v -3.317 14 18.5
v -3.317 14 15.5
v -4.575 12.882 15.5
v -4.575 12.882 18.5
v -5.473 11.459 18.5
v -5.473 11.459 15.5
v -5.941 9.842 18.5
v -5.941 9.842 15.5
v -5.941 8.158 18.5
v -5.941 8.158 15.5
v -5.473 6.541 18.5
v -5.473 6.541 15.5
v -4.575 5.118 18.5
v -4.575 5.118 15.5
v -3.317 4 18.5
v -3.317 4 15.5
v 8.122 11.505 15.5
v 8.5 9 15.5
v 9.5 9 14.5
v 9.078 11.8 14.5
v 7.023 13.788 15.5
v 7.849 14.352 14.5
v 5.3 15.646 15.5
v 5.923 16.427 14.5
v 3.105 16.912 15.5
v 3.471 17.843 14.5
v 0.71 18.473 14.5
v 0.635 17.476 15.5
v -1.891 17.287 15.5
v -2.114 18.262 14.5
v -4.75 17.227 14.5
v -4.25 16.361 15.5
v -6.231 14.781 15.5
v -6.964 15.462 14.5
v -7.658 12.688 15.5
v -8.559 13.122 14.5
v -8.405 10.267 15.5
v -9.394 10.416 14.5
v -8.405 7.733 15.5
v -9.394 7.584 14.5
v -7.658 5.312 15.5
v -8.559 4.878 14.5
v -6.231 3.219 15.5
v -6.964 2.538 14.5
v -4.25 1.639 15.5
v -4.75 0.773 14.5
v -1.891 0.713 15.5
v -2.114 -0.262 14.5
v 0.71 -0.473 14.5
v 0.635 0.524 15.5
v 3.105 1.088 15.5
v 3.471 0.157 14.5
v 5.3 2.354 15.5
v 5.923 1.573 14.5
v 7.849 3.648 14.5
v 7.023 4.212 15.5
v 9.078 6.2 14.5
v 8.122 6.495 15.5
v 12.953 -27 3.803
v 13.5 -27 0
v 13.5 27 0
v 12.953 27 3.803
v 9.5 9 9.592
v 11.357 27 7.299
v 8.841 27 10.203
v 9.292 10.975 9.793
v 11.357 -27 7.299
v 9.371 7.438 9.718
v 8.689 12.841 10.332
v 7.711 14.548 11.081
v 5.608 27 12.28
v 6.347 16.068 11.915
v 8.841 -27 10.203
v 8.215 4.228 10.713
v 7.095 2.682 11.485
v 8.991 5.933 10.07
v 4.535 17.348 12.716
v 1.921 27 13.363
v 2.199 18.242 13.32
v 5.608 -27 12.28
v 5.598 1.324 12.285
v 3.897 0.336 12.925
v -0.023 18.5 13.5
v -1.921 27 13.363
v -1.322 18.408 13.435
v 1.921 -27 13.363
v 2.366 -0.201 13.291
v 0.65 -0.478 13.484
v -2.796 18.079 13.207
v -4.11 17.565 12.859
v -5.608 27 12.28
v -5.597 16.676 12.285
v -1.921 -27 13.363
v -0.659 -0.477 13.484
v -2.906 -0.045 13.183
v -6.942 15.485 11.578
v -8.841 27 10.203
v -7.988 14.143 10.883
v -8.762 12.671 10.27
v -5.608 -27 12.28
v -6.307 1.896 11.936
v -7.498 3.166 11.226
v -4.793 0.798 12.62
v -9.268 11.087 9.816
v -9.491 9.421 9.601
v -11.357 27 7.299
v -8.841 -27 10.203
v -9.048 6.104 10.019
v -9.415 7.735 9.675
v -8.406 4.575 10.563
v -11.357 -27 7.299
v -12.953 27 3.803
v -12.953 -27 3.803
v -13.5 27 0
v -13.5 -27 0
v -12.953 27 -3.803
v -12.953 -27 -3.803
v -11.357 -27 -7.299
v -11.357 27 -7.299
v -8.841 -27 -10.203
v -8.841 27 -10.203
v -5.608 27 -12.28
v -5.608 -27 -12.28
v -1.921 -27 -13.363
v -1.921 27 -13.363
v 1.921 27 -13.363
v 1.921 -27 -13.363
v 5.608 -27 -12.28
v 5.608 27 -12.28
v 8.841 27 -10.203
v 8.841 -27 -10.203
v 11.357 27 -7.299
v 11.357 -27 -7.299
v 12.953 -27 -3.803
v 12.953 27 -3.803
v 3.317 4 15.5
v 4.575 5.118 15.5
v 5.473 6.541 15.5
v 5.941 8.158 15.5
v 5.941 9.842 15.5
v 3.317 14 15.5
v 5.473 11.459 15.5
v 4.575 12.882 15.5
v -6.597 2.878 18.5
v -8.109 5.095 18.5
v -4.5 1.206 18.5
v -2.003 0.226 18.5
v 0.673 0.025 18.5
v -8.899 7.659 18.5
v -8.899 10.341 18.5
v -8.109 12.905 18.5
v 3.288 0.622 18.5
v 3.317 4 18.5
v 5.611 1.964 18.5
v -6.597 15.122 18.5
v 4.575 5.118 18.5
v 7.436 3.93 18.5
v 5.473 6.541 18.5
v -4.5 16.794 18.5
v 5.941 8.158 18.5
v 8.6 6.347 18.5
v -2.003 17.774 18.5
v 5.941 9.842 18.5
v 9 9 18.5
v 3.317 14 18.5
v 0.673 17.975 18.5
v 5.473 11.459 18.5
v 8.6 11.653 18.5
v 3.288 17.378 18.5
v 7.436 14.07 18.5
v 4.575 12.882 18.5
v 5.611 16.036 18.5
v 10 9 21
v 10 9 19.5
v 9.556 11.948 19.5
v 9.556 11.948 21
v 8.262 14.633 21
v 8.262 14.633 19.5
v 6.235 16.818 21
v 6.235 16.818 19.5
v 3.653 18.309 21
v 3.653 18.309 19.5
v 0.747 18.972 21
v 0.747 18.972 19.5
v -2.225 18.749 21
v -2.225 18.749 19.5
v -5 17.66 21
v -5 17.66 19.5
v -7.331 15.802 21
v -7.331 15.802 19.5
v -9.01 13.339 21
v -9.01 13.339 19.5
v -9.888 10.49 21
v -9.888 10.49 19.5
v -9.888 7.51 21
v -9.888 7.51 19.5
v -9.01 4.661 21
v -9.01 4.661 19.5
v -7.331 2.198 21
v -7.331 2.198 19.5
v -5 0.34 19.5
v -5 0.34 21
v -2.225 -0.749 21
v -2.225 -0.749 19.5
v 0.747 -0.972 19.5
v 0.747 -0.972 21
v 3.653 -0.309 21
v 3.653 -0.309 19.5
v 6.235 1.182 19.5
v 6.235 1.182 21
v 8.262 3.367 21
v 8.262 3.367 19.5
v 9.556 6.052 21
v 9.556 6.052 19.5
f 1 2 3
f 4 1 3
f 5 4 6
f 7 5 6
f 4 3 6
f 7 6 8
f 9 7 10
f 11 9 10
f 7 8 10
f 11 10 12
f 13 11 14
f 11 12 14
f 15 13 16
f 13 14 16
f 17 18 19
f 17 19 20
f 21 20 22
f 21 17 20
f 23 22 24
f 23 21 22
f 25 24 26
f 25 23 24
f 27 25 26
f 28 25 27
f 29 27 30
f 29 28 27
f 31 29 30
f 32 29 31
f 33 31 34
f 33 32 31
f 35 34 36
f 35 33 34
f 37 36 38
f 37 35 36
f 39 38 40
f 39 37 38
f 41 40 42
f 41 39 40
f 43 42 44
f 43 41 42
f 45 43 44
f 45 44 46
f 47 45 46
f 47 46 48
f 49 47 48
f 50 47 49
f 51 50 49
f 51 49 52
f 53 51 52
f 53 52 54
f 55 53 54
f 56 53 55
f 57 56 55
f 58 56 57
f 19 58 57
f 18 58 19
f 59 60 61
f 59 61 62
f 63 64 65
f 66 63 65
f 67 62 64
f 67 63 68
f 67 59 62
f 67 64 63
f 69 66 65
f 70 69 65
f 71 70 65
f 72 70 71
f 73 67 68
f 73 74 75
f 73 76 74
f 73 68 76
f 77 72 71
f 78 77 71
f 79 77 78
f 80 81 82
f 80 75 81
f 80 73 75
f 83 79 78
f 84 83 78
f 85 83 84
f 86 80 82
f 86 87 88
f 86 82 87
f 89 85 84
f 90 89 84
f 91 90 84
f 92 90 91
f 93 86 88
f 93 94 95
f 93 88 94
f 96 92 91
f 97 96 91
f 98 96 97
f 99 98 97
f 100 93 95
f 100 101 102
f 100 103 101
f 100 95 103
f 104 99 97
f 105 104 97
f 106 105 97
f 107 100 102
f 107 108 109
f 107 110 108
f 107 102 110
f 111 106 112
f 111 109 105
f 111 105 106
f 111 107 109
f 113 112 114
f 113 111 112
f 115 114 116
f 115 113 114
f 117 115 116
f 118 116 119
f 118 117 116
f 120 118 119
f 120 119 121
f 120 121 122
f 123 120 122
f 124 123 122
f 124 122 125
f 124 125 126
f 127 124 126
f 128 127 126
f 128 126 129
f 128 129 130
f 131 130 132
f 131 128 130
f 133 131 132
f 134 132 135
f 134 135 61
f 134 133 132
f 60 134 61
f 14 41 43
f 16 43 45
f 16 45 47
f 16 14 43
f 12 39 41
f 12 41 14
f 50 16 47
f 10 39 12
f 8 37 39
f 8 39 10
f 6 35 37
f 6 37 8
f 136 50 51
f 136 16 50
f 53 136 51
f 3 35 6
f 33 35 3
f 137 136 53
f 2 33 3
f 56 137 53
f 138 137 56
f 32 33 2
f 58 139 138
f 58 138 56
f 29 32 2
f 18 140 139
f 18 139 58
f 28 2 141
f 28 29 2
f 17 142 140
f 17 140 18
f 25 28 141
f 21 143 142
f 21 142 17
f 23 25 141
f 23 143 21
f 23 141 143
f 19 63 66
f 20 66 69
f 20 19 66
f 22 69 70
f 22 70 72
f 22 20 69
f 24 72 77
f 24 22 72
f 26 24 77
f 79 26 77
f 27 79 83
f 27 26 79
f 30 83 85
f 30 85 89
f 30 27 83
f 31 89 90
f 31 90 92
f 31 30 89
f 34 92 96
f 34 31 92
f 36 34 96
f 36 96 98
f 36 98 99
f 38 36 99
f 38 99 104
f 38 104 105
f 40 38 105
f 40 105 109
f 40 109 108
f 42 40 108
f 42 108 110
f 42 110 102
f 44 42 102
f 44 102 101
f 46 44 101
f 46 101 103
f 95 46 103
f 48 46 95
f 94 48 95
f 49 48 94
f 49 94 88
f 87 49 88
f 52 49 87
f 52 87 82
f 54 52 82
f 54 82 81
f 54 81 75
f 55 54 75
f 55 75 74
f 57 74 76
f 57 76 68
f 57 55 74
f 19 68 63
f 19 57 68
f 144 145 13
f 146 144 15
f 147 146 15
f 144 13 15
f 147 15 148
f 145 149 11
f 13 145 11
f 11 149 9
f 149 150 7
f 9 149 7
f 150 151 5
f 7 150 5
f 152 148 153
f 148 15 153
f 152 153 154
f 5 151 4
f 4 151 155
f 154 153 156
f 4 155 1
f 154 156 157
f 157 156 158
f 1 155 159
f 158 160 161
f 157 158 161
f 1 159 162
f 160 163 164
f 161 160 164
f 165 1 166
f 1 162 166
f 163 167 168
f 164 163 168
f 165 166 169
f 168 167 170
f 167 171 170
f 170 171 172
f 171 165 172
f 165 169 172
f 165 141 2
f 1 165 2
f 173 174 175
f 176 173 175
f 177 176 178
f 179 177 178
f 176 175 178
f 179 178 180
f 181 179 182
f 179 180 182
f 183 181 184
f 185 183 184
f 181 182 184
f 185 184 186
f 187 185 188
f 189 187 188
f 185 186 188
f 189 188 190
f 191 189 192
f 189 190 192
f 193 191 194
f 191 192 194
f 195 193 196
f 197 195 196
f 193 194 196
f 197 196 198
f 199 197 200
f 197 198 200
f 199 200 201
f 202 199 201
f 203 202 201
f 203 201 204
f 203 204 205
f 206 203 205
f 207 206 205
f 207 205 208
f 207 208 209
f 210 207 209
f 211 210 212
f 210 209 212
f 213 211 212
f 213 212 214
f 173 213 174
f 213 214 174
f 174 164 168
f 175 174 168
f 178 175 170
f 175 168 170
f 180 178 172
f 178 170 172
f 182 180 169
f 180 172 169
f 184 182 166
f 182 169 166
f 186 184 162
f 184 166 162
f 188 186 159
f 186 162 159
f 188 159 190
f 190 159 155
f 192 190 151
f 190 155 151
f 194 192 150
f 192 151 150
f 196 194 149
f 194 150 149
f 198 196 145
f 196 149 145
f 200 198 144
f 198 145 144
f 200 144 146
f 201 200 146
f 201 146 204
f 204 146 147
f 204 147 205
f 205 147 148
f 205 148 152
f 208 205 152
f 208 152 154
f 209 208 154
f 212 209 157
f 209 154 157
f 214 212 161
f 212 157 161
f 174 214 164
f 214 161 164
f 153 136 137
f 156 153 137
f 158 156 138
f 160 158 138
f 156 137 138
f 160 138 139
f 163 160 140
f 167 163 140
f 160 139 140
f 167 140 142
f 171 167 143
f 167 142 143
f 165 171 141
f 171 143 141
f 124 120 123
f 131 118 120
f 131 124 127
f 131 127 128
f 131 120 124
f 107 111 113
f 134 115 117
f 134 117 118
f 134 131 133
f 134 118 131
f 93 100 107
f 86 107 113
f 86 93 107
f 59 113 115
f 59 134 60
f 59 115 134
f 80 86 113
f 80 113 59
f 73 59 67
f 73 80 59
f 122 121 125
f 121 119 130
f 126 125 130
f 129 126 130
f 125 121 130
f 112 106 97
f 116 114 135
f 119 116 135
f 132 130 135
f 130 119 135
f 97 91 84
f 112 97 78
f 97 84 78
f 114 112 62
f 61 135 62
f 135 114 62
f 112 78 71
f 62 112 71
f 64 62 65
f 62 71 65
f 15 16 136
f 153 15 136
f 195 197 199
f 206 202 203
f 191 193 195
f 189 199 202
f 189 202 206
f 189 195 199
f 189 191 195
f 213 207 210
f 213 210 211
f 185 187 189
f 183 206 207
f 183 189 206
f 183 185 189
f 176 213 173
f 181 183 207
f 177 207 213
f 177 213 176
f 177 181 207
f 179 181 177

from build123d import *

# Parameters (mm, degrees)
F0_R     = 13.5
F1_DEPTH = 27
F3_R     = 9.5
F5_SIZE  = 1
F7_DEPTH = 3
F8_R     = 10
F9_DEPTH = 2.5
F10_SIZE = 1


with BuildPart() as f1:
    # F0 (on Front) → F1 (new body, symmetric)
    with BuildSketch(Plane.XZ):
        Circle(F0_R)
    extrude(amount=F1_DEPTH, both=True)

    # F3 (on offset) → F4 (join, up to the next surface of F1)
    with BuildSketch(Plane.XY.offset(15.5)):
        with Locations((0, 9)):
            Circle(F3_R)
    extrude(until=Until.NEXT, dir=(0, 0, -1))

    # F5
    f5_edges = [f1.edges().sort_by_distance(p)[0] for p in [
        (-9.5, 9, 15.5),
    ]]
    chamfer(f5_edges, length=F5_SIZE)

    # F6 (on face) → F7 (join)
    with BuildSketch(Plane.XY.offset(15.5)):
        with BuildLine():
            Line((3.3166247904, 14), (-3.3166247904, 14))
            ThreePointArc((-3.3166247904, 14), (-6, 9), (-3.3166247904, 4))
            Line((-3.3166247904, 4), (3.3166247904, 4))
            ThreePointArc((3.3166247904, 4), (6, 9), (3.3166247904, 14))
        make_face()
    extrude(amount=F7_DEPTH)

    # F8 (on face) → F9 (join)
    with BuildSketch(Plane.XY.offset(18.5)):
        with Locations((0, 9)):
            Circle(F8_R)
    extrude(amount=F9_DEPTH)

    # F10
    f10_edges = [f1.edges().sort_by_distance(p)[0] for p in [
        (-10, 9, 18.5),
    ]]
    chamfer(f10_edges, length=F10_SIZE)


solid = f1.part
